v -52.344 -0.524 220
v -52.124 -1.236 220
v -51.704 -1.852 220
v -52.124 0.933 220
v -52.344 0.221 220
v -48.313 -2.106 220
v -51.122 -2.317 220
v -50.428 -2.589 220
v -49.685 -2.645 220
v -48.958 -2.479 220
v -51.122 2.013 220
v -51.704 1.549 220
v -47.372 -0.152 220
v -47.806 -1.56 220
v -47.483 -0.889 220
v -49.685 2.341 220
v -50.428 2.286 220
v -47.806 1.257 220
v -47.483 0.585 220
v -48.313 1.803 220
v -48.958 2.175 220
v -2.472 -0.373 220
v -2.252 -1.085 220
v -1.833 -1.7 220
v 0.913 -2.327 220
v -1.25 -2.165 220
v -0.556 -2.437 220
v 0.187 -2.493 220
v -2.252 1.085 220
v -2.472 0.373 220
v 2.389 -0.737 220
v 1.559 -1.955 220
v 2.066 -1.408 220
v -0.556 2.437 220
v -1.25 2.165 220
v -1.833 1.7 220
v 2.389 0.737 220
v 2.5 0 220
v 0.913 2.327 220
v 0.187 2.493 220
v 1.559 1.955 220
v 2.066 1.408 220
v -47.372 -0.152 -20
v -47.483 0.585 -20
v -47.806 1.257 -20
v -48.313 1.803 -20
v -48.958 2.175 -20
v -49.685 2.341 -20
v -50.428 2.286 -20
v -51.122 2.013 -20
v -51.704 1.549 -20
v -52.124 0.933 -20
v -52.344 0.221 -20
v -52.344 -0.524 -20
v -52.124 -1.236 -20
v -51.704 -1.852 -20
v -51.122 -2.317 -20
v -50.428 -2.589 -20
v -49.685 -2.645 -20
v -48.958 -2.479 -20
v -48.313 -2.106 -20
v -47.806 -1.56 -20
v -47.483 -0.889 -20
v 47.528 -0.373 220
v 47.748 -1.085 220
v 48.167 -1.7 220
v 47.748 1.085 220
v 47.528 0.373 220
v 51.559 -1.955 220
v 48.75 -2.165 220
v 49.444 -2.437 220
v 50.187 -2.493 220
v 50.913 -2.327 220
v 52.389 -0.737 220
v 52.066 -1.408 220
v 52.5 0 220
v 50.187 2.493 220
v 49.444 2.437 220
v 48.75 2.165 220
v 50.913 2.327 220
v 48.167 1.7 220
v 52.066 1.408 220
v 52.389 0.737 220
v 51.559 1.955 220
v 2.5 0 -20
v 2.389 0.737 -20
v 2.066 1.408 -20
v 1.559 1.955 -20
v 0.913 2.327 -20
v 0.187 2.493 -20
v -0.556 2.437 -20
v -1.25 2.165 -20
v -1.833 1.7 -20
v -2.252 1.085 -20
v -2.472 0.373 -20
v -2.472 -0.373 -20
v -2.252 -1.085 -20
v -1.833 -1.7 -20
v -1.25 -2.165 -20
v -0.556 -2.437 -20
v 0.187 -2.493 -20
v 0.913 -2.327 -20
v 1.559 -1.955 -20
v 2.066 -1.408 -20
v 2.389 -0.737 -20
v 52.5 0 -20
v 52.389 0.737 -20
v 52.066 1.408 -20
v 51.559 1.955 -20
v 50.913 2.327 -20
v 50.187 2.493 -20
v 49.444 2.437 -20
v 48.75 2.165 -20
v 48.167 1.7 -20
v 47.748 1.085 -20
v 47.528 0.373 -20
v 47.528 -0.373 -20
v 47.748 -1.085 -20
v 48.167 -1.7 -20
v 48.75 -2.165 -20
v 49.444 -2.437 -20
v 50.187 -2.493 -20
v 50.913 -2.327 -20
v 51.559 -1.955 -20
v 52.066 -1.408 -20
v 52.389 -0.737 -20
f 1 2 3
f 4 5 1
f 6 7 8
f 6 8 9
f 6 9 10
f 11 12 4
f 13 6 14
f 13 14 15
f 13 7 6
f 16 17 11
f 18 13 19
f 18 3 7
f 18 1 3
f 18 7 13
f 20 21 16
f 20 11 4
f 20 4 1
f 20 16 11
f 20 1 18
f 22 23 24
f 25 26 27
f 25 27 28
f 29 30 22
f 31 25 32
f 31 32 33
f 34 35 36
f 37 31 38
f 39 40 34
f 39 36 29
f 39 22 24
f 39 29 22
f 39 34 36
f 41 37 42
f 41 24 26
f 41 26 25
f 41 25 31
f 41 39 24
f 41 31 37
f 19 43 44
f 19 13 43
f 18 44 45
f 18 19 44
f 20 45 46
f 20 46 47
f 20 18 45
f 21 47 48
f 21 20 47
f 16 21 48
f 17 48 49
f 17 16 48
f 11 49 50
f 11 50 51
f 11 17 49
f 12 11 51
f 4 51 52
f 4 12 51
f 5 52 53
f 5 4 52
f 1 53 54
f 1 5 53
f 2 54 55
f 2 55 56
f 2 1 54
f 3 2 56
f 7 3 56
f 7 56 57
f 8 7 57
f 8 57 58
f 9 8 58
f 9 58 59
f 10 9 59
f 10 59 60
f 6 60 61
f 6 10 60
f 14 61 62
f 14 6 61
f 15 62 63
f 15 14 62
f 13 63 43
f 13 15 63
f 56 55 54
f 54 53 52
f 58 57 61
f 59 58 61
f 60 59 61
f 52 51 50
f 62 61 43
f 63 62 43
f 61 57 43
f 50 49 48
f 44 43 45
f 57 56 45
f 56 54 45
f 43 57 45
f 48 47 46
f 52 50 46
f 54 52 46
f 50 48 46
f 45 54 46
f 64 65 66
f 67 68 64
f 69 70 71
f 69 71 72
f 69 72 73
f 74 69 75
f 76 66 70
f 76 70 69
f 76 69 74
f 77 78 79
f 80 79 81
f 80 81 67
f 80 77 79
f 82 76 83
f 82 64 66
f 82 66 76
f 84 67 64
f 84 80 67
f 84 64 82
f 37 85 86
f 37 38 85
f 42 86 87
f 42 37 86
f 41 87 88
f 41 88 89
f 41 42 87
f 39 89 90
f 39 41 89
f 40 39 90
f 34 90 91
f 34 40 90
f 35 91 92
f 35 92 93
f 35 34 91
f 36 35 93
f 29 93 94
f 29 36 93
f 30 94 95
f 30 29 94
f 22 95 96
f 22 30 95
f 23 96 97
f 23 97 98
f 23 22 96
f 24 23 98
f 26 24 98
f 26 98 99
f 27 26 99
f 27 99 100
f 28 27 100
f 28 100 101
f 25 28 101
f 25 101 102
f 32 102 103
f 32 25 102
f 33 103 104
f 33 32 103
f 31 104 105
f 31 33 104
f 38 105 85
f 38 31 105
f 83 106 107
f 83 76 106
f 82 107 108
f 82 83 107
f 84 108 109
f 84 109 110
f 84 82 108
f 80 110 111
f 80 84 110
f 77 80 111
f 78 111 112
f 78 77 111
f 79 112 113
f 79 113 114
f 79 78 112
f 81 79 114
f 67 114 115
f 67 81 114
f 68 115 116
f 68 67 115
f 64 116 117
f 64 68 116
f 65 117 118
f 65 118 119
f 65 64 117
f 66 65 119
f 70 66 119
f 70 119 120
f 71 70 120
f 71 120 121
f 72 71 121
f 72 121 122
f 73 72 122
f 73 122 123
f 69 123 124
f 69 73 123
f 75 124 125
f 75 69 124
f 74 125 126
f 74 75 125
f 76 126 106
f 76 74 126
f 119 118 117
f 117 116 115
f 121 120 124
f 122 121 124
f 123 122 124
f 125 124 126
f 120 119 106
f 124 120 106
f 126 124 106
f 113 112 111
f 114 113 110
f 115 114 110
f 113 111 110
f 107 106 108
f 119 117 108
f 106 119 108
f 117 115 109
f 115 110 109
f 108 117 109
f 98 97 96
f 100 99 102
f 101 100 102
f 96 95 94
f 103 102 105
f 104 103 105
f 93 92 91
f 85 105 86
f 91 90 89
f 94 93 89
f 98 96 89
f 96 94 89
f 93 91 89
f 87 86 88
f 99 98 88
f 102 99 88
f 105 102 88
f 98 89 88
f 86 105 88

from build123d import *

# Parameters (mm, degrees)
F0_R          = 2.5
F1_DEPTH      = 220
F1_DEPTH_BACK = 20


with BuildPart() as f1:
    # F0 (on Top) → F1 (new body, two sides)
    with BuildSketch(Plane.XY) as f1_sk:
        Circle(F0_R)
        with Locations((50, 0)):
            Circle(F0_R)
        with Locations((-49.871642, -0.151778)):
            Circle(F0_R)
    extrude(amount=F1_DEPTH)
    extrude(f1_sk.sketch, amount=-F1_DEPTH_BACK)


solid = f1.part
